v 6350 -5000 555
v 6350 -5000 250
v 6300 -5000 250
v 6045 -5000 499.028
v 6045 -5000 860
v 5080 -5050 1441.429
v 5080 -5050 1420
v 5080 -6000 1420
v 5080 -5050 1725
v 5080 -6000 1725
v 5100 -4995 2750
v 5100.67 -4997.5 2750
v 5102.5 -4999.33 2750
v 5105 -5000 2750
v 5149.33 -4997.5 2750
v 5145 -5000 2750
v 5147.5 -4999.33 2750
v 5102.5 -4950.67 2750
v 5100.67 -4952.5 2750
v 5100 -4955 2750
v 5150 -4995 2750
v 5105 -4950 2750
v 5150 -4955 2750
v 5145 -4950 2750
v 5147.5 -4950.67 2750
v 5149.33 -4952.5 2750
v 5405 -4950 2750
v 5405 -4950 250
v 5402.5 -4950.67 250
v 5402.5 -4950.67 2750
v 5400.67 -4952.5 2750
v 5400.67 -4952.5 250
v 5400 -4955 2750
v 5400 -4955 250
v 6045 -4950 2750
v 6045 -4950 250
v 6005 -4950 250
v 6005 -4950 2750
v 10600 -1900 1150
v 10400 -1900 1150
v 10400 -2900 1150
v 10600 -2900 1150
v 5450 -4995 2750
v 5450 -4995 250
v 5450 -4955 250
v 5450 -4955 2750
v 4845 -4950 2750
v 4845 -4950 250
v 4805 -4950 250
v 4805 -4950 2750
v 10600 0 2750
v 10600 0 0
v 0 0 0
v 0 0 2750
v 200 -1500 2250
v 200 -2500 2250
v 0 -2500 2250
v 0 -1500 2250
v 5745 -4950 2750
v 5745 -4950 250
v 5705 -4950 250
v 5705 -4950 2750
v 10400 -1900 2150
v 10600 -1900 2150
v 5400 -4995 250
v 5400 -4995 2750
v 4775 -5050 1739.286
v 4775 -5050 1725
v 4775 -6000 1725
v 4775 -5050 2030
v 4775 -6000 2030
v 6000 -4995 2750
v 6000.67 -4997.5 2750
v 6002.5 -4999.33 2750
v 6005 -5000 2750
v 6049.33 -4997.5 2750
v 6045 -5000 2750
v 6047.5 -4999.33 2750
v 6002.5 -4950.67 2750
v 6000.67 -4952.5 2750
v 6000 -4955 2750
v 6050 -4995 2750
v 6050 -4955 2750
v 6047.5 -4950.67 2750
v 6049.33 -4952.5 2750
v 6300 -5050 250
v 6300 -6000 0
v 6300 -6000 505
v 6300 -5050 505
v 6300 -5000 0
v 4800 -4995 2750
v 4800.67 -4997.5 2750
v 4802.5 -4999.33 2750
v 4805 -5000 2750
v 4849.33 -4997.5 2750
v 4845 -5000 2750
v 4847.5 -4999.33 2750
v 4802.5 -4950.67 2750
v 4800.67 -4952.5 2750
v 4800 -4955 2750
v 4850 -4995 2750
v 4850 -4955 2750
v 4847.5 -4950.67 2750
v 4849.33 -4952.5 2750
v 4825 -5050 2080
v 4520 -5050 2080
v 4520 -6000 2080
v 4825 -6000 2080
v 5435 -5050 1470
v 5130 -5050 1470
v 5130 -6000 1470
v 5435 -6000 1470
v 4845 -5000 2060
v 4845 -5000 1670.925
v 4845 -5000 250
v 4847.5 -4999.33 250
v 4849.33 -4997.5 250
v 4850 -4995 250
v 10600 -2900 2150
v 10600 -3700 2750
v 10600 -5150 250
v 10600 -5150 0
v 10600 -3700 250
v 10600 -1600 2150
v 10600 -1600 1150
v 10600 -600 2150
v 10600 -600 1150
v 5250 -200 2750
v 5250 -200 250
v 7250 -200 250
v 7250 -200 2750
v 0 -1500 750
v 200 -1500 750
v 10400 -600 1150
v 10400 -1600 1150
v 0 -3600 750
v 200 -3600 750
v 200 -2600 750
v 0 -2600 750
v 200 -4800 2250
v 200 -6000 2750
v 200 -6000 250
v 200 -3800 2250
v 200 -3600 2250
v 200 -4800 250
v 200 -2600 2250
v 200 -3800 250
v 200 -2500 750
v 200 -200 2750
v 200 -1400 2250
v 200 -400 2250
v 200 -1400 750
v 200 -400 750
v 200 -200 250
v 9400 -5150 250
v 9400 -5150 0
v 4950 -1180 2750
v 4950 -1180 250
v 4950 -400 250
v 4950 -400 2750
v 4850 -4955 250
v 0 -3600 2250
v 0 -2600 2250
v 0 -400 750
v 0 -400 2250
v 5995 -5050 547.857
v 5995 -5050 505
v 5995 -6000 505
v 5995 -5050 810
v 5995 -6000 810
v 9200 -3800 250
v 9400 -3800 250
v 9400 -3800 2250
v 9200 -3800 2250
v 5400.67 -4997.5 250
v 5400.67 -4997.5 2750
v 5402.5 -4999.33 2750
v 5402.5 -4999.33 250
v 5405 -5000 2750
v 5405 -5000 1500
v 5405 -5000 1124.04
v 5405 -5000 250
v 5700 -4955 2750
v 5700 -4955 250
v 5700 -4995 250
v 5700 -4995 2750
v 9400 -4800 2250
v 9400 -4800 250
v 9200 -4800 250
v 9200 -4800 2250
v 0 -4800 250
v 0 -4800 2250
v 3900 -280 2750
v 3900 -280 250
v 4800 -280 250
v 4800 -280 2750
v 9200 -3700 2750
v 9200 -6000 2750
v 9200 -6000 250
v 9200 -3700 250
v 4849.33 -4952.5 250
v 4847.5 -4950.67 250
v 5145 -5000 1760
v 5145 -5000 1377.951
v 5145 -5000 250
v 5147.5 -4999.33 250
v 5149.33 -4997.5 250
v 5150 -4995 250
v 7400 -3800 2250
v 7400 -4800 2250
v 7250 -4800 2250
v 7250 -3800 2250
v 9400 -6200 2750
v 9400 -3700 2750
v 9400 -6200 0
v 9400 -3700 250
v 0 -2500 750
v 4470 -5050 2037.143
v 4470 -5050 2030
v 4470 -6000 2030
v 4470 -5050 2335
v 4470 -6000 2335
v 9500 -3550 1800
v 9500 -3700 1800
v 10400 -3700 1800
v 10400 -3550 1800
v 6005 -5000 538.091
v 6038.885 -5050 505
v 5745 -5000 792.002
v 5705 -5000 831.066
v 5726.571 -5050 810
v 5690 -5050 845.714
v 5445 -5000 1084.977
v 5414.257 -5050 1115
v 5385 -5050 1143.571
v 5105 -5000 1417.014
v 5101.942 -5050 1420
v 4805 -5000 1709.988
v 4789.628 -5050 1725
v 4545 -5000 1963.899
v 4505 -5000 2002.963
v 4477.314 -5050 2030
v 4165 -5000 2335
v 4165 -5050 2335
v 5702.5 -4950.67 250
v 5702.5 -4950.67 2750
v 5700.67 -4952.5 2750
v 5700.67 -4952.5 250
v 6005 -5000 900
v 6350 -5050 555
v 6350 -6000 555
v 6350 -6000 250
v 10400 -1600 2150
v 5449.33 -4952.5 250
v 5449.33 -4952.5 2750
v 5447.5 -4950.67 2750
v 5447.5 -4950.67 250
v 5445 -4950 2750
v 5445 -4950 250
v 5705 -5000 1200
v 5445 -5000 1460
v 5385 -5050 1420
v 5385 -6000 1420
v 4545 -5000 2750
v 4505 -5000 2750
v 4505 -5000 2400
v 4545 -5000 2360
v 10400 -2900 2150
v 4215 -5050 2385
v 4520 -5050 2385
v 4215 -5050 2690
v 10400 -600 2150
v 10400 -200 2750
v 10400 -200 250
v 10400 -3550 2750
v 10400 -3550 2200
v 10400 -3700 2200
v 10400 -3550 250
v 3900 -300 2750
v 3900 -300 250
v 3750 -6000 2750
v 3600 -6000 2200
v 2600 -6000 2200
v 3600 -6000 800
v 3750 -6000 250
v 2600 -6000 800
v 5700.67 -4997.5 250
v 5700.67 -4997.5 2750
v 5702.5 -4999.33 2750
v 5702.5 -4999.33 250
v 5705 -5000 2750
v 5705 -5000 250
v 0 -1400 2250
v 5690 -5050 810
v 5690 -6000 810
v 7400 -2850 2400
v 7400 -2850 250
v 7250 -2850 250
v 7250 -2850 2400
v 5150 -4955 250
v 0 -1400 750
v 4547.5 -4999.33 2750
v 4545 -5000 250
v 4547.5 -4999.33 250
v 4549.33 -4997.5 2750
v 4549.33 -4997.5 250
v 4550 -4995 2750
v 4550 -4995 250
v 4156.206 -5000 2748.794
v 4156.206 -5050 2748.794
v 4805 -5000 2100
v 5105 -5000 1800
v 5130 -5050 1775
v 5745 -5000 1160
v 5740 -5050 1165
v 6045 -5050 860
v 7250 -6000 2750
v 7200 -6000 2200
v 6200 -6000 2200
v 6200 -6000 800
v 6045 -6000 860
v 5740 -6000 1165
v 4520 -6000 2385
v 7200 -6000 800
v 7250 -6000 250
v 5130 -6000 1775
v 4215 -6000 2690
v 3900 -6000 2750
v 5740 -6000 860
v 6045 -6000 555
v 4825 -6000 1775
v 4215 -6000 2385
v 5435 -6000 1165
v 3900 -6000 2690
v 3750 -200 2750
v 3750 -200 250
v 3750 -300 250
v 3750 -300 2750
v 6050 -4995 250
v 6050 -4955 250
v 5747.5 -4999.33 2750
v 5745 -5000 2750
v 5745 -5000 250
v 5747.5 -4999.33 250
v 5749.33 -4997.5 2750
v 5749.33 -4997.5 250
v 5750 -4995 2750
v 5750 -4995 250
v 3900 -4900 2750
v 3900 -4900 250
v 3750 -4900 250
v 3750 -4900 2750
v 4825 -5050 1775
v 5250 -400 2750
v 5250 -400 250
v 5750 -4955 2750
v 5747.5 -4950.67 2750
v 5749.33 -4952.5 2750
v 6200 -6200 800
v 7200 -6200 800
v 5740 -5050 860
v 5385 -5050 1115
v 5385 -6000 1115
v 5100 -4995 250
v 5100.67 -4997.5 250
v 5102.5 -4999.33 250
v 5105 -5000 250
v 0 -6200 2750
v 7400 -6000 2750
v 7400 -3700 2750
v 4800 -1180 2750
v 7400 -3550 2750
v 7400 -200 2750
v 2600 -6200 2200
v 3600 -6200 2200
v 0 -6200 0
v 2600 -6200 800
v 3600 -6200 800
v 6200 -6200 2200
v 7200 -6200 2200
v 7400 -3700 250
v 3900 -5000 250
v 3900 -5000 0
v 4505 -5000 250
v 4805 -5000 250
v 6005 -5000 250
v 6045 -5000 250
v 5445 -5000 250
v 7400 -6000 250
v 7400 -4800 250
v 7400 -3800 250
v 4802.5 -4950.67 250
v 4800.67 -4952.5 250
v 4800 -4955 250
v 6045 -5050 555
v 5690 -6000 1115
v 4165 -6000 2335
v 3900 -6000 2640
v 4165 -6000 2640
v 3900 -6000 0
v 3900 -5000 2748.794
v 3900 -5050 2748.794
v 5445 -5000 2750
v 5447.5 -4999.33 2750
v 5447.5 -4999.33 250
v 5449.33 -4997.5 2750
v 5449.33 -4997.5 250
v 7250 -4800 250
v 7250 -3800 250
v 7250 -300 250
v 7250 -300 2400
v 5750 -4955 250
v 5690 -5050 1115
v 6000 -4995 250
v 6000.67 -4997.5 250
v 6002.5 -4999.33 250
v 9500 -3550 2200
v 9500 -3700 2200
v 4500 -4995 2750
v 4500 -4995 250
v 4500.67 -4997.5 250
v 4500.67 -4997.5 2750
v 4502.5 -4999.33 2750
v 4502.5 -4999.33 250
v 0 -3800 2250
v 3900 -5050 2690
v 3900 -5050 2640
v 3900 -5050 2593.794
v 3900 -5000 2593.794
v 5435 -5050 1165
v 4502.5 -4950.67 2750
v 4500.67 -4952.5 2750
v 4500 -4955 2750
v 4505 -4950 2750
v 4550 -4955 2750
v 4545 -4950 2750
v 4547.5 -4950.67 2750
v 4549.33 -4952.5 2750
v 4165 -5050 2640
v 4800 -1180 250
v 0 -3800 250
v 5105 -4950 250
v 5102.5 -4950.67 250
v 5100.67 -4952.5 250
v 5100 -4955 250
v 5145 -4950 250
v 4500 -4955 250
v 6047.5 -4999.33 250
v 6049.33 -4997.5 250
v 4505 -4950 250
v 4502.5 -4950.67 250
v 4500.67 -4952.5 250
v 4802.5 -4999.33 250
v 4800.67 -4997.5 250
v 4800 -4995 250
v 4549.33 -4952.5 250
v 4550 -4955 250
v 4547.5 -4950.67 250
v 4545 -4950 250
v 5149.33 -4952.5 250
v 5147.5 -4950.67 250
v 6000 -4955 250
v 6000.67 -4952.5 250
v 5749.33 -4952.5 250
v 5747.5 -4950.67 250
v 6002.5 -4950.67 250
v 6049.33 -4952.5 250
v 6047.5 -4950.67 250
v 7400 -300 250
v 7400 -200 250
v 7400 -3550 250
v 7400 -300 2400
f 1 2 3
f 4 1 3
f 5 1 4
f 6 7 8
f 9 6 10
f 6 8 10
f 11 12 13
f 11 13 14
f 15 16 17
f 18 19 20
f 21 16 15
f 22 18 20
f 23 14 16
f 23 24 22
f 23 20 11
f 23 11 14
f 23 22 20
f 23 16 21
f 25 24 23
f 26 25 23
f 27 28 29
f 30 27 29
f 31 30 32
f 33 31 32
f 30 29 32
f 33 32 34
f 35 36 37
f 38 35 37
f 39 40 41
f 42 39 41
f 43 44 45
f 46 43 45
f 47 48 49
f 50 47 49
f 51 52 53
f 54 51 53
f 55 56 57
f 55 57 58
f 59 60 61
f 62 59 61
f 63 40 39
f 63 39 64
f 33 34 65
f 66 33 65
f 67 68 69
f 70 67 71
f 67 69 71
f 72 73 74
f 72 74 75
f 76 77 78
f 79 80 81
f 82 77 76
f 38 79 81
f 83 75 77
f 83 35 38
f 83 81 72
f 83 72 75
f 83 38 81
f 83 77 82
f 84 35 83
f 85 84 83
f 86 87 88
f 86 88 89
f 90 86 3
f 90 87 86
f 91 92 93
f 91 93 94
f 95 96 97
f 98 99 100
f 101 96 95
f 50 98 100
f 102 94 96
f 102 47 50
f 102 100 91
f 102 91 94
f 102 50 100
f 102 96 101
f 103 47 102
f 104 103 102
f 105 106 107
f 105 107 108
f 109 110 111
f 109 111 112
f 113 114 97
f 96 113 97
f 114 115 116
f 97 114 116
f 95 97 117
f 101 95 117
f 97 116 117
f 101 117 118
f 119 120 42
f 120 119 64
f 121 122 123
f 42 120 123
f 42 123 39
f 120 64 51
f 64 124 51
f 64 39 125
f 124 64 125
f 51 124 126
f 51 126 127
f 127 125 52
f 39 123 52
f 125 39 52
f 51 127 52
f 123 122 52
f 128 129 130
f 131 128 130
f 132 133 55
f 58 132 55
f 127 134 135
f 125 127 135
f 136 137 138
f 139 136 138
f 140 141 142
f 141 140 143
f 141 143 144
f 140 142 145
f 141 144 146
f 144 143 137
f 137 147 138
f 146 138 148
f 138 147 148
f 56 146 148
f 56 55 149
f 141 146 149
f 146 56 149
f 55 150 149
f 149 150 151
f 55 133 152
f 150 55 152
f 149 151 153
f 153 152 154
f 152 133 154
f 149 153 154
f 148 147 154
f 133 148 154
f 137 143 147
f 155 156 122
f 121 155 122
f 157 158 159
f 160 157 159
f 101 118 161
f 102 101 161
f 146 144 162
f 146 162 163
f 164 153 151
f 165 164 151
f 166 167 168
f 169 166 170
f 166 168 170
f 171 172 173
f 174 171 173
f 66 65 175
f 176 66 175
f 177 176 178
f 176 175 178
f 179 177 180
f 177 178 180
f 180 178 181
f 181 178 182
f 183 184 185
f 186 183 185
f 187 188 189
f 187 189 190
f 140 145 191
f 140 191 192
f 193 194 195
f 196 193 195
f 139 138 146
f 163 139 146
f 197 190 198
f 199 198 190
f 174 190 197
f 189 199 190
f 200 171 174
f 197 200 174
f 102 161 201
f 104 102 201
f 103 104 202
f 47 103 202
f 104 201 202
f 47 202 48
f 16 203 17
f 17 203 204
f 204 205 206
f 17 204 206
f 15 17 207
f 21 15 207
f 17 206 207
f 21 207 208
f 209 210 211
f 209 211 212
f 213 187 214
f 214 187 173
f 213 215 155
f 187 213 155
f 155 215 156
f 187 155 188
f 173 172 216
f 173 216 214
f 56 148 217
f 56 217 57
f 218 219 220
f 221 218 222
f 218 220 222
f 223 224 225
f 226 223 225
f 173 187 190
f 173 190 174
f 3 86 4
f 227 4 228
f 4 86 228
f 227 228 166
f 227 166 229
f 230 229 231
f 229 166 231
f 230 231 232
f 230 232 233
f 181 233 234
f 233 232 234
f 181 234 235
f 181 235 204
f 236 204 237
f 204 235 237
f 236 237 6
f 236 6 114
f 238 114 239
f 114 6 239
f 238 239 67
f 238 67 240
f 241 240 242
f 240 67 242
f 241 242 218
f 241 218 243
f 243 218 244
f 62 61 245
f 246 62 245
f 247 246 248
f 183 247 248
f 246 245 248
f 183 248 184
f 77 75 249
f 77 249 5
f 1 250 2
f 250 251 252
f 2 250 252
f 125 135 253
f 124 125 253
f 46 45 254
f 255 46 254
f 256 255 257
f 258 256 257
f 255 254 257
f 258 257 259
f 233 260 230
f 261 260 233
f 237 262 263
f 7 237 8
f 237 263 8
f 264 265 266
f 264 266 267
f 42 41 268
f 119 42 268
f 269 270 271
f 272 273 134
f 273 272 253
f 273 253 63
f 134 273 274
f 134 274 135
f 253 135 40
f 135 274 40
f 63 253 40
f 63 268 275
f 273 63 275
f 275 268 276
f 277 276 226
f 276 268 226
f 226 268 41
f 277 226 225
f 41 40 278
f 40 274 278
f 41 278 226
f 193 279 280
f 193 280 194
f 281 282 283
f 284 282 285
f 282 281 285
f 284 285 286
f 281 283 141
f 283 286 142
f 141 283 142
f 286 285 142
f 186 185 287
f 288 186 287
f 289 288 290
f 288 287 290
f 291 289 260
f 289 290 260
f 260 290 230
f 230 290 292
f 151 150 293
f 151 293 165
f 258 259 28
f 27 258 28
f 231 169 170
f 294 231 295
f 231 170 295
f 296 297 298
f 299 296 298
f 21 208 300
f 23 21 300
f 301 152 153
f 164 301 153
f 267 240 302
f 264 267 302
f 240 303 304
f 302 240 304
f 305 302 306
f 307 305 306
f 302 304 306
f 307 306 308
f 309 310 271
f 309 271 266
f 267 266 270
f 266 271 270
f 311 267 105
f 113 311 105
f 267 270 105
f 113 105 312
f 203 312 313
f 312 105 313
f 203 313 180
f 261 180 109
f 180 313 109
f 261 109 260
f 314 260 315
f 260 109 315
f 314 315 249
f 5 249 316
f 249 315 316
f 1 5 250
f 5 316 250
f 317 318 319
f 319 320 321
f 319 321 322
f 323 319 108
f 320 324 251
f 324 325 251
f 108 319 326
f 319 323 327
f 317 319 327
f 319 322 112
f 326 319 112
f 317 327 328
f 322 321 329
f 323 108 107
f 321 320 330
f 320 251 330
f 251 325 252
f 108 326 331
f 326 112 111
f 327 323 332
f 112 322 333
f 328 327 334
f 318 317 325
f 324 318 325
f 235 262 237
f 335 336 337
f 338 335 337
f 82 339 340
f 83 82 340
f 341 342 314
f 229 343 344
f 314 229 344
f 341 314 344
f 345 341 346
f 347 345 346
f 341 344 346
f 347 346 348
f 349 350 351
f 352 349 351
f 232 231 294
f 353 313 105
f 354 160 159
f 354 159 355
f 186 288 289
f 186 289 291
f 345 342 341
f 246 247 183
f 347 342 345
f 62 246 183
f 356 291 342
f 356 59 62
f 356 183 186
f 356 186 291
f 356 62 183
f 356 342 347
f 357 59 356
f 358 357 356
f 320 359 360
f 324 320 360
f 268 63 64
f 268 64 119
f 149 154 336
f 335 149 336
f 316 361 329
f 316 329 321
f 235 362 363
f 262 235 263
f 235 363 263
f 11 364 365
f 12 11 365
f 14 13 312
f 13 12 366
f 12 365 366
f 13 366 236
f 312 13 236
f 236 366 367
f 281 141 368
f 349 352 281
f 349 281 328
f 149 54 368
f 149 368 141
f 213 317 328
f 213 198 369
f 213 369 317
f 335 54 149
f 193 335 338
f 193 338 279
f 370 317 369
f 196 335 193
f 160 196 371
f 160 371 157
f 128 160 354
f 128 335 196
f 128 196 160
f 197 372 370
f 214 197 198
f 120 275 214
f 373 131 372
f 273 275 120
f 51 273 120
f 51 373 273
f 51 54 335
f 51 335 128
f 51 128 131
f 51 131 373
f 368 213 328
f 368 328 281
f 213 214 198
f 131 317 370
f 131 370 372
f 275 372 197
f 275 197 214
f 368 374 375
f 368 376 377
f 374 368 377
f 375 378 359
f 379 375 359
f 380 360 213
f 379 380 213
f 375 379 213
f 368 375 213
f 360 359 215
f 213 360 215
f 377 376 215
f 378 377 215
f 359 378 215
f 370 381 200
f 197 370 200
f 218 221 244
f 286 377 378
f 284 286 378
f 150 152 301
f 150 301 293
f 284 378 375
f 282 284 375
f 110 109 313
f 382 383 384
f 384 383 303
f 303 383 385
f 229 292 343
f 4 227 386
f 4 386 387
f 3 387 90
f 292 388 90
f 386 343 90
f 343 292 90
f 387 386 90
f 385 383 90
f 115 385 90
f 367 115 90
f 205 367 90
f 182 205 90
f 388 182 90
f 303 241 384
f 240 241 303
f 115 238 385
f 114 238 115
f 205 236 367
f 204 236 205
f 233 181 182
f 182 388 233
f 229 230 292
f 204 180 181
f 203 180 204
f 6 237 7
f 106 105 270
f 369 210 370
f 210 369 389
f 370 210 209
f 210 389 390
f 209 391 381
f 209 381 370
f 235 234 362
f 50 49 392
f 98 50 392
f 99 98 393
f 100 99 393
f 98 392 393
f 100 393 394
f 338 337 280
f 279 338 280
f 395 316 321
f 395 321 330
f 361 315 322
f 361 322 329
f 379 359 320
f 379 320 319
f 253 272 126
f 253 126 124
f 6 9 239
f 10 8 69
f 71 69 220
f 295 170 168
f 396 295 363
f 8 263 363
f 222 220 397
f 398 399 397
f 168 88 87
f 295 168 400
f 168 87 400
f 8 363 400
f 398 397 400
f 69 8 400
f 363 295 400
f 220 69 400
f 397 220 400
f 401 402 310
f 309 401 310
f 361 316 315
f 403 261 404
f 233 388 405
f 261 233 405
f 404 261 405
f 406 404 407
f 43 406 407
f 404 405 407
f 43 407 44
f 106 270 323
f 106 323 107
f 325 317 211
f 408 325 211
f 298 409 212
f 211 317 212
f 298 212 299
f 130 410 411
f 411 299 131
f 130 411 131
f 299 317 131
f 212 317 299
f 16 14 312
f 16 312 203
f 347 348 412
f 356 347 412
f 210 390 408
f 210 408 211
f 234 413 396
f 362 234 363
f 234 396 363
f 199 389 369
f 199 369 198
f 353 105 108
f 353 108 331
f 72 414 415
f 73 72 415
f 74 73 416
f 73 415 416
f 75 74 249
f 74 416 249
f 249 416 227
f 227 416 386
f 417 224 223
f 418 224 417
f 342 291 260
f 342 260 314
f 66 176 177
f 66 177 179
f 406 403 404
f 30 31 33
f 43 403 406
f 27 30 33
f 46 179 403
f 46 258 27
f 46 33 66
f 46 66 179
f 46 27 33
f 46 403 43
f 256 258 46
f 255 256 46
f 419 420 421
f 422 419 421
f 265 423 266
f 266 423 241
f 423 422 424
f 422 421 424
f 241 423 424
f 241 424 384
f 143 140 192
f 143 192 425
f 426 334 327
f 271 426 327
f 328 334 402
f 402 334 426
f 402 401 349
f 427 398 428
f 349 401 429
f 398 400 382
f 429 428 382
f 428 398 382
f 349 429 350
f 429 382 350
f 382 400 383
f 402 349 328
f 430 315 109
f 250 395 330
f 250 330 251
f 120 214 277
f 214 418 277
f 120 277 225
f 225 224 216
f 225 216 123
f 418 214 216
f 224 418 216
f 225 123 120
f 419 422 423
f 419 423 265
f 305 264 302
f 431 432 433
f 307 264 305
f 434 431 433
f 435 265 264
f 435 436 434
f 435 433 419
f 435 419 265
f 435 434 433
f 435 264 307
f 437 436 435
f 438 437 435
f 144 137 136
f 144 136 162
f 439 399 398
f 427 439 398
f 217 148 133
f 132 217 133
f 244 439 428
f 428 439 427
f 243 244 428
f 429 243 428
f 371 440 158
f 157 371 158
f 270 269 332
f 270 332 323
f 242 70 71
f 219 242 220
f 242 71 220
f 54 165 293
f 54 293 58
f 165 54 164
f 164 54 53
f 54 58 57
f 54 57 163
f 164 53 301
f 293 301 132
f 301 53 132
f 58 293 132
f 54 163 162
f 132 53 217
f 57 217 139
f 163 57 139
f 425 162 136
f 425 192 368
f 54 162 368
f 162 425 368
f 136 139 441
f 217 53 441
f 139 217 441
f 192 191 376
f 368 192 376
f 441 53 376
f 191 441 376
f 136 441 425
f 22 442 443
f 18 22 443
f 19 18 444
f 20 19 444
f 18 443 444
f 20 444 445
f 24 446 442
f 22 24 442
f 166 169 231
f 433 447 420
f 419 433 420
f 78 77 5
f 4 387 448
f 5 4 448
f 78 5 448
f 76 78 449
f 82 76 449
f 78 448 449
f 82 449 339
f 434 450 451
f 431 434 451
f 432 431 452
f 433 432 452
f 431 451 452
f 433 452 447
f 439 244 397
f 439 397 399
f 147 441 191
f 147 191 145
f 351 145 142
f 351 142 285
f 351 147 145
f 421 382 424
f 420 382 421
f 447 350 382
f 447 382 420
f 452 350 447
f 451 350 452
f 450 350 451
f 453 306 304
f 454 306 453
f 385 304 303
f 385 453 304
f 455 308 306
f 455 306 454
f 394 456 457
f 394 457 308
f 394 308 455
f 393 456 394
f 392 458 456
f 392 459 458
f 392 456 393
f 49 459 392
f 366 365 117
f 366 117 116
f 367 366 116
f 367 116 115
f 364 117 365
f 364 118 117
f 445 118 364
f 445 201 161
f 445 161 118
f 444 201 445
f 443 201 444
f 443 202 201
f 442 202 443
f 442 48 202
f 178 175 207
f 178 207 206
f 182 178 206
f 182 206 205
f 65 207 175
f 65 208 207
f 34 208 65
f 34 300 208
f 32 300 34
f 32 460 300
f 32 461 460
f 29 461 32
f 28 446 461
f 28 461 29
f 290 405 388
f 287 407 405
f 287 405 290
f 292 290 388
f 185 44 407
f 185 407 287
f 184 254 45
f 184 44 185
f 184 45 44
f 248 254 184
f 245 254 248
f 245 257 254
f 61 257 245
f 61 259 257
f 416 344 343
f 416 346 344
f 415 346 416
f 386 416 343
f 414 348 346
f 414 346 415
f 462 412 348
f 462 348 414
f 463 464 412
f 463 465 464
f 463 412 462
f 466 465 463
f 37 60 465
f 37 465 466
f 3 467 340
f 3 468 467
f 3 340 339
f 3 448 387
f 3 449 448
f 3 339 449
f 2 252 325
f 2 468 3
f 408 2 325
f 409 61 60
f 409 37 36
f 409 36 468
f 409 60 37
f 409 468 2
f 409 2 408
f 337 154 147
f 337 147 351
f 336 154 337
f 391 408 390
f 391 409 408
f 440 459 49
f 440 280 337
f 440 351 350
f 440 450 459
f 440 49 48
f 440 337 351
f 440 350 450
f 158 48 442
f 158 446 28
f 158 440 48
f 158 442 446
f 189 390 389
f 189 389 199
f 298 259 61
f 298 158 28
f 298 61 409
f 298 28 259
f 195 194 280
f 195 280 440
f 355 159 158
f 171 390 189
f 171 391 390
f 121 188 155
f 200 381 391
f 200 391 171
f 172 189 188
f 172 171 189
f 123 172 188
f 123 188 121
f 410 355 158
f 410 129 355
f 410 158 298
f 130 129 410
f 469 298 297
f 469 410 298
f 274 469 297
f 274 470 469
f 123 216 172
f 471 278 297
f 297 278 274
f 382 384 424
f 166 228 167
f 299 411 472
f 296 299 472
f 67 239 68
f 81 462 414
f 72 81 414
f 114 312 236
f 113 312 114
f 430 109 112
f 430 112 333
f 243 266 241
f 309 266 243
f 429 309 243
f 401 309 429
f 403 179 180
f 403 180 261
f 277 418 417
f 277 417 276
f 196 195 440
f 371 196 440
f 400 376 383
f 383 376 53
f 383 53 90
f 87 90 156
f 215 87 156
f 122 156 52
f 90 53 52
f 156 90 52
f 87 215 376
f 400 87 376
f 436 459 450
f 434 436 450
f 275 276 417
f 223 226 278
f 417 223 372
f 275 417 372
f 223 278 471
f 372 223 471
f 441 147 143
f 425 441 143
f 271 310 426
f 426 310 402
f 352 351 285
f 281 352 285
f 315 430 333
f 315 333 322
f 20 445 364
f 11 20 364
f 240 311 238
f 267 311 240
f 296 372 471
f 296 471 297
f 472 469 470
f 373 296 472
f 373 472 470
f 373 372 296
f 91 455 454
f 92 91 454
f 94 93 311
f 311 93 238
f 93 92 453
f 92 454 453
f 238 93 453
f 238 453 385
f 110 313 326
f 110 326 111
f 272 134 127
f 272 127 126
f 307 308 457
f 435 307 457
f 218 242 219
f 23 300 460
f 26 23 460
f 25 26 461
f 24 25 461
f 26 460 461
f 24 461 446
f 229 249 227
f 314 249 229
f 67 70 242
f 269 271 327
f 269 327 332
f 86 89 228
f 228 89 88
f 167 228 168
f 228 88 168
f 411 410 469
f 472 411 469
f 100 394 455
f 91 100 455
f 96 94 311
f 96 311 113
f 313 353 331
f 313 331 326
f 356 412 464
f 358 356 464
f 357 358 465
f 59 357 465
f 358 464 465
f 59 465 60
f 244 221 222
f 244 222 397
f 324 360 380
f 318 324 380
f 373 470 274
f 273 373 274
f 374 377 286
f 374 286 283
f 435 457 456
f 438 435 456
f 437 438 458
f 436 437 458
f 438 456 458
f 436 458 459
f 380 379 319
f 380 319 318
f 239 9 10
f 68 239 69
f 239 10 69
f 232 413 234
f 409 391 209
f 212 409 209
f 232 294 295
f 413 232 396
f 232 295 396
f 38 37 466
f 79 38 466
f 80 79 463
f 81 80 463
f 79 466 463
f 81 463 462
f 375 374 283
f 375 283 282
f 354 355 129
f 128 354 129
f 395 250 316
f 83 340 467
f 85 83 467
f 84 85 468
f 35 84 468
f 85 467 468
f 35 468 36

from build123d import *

# Parameters (mm, degrees)
F0_W      = 2400
F0_H      = 1000
F1_DEPTH  = 250
F2_W      = 1800
F2_H      = 2300
F3_DEPTH  = 2500
F4_W      = 1000
F4_H      = 2000
F5_DEPTH  = 9400.001
F6_W      = 1000
F6_H      = 1400
F6_W_2    = 900
F6_H_2    = 400
F7_DEPTH  = 6000
F8_W      = 1000
F8_H      = 1000
F9_DEPTH  = 200
F10_W     = 1000
F10_H     = 1500
F11_DEPTH = 200
F12_W     = 150
F12_H     = 2550
F13_DEPTH = 350
F15_DEPTH = 950
F17_DEPTH = 50
F19_DEPTH = 2500


with BuildPart() as f1:
    # F0 (on Top) → F1 (new body)
    with BuildSketch(Plane.XY):
        Polygon((10600, 0), (0, 0), (0, -6200), (9400, -6200), (9400, -5150), (10600, -5150), align=None)
        with Locations((5100, -5500)):
            Rectangle(F0_W, F0_H, mode=Mode.SUBTRACT)
    extrude(amount=F1_DEPTH)

    # F2 (on face) → F3 (join)
    with BuildSketch(Plane.XY.offset(250)):
        Polygon((10600, 0), (0, 0), (0, -6200), (9400, -6200), (9400, -3700), (10600, -3700), align=None)
        with Locations((8300, -4850)):
            Rectangle(F2_W, F2_H, mode=Mode.SUBTRACT)
        Polygon((200, -6000), (200, -200), (3750, -200), (3750, -300), (3900, -300), (3900, -280), (4800, -280), (4800, -1180), (4950, -1180), (4950, -400), (5250, -400), (5250, -200), (7250, -200), (7250, -300), (7400, -300), (7400, -200), (10400, -200), (10400, -3550), (7400, -3550), (7400, -2850), (7250, -2850), (7250, -6000), (3900, -6000), (3900, -4900), (3750, -4900), (3750, -6000), align=None, mode=Mode.SUBTRACT)
    extrude(amount=F3_DEPTH)

    # F4 (on face) → F5 (cut, through all)
    with BuildSketch(Plane.YZ.offset(9400)):
        with Locations((-4300, 1250)):
            Rectangle(F4_W, F4_H)
    extrude(amount=-F5_DEPTH, mode=Mode.SUBTRACT)

    # F6 (on face) → F7 (cut, through all)
    with BuildSketch(Plane.XZ.offset(6200)):
        with Locations((6700, 1500)):
            Rectangle(F6_W, F6_H)
        with Locations((3100, 1500)):
            Rectangle(F6_W, F6_H)
        with Locations((9950, 2000)):
            Rectangle(F6_W_2, F6_H_2)
    extrude(amount=-F7_DEPTH, mode=Mode.SUBTRACT)

    # F8 (on face) → F9 (cut, through all)
    with BuildSketch(Plane(origin=(10400, 0, 0), x_dir=(0, -1, 0), z_dir=(-1, 0, 0))):
        with Locations((1100, 1650)):
            Rectangle(F8_W, F8_H)
        with Locations((2400, 1650)):
            Rectangle(F8_W, F8_H)
    extrude(amount=-F9_DEPTH, mode=Mode.SUBTRACT)

    # F10 (on face) → F11 (cut, through all)
    with BuildSketch(Plane.YZ.offset(200)):
        with Locations((-3100, 1500)):
            Rectangle(F10_W, F10_H)
        with Locations((-2000, 1500)):
            Rectangle(F10_W, F10_H)
        with Locations((-900, 1500)):
            Rectangle(F10_W, F10_H)
    extrude(amount=-F11_DEPTH, mode=Mode.SUBTRACT)

    # F12 (on face) → F13 (join)
    with BuildSketch(Plane.XY.offset(2750)):
        with Locations((7325, -1575)):
            Rectangle(F12_W, F12_H)
    extrude(amount=-F13_DEPTH)

    # F14 (on face) → F15 (join)
    with BuildSketch(Plane(origin=(0, -6000, 0), x_dir=(-1, 0, 0), z_dir=(0, 1, 0))):
        Polygon((-6350, 555), (-6350, 250), (-6300, 250), (-6300, 505), (-5995, 505), (-5995, 810), (-5690, 810), (-5690, 1115), (-5385, 1115), (-5385, 1420), (-5080, 1420), (-5080, 1725), (-4775, 1725), (-4775, 2030), (-4470, 2030), (-4470, 2335), (-4165, 2335), (-4165, 2640), (-3900, 2640), (-3900, 2690), (-4215, 2690), (-4215, 2385), (-4520, 2385), (-4520, 2080), (-4825, 2080), (-4825, 1775), (-5130, 1775), (-5130, 1470), (-5435, 1470), (-5435, 1165), (-5740, 1165), (-5740, 860), (-6045, 860), (-6045, 555), align=None)
    extrude(amount=F15_DEPTH)

    # F16 (on face) → F17 (join)
    with BuildSketch(Plane(origin=(0, -5050, 0), x_dir=(-1, 0, 0), z_dir=(0, 1, 0))):
        Polygon((-4156.206089, 2748.793911), (-6350, 555), (-6350, 250), (-6300, 250), (-4165, 2335), (-3900, 2593.793911), (-3900, 2748.793911), align=None)
    extrude(amount=F17_DEPTH)

    # F18 (on face) → F19 (join)
    with BuildSketch(Plane.XY.offset(250)):
        with BuildLine():
            Line((6005, -5000), (6045, -5000))
            ThreePointArc((6045, -5000), (6048.535534, -4998.535534), (6050, -4995))
            Line((6050, -4995), (6050, -4955))
            ThreePointArc((6050, -4955), (6048.535534, -4951.464466), (6045, -4950))
            Line((6045, -4950), (6005, -4950))
            ThreePointArc((6005, -4950), (6001.464466, -4951.464466), (6000, -4955))
            Line((6000, -4955), (6000, -4995))
            ThreePointArc((6000, -4995), (6001.464466, -4998.535534), (6005, -5000))
        make_face()
        with BuildLine():
            Line((5705, -5000), (5745, -5000))
            ThreePointArc((5745, -5000), (5748.535534, -4998.535534), (5750, -4995))
            Line((5750, -4995), (5750, -4955))
            ThreePointArc((5750, -4955), (5748.535534, -4951.464466), (5745, -4950))
            Line((5745, -4950), (5705, -4950))
            ThreePointArc((5705, -4950), (5701.464466, -4951.464466), (5700, -4955))
            Line((5700, -4955), (5700, -4995))
            ThreePointArc((5700, -4995), (5701.464466, -4998.535534), (5705, -5000))
        make_face()
        with BuildLine():
            Line((5405, -5000), (5445, -5000))
            ThreePointArc((5445, -5000), (5448.535534, -4998.535534), (5450, -4995))
            Line((5450, -4995), (5450, -4955))
            ThreePointArc((5450, -4955), (5448.535534, -4951.464466), (5445, -4950))
            Line((5445, -4950), (5405, -4950))
            ThreePointArc((5405, -4950), (5401.464466, -4951.464466), (5400, -4955))
            Line((5400, -4955), (5400, -4995))
            ThreePointArc((5400, -4995), (5401.464466, -4998.535534), (5405, -5000))
        make_face()
        with BuildLine():
            Line((5105, -5000), (5145, -5000))
            ThreePointArc((5145, -5000), (5148.535534, -4998.535534), (5150, -4995))
            Line((5150, -4995), (5150, -4955))
            ThreePointArc((5150, -4955), (5148.535534, -4951.464466), (5145, -4950))
            Line((5145, -4950), (5105, -4950))
            ThreePointArc((5105, -4950), (5101.464466, -4951.464466), (5100, -4955))
            Line((5100, -4955), (5100, -4995))
            ThreePointArc((5100, -4995), (5101.464466, -4998.535534), (5105, -5000))
        make_face()
        with BuildLine():
            Line((4805, -5000), (4845, -5000))
            ThreePointArc((4845, -5000), (4848.535534, -4998.535534), (4850, -4995))
            Line((4850, -4995), (4850, -4955))
            ThreePointArc((4850, -4955), (4848.535534, -4951.464466), (4845, -4950))
            Line((4845, -4950), (4805, -4950))
            ThreePointArc((4805, -4950), (4801.464466, -4951.464466), (4800, -4955))
            Line((4800, -4955), (4800, -4995))
            ThreePointArc((4800, -4995), (4801.464466, -4998.535534), (4805, -5000))
        make_face()
        with BuildLine():
            Line((4505, -5000), (4545, -5000))
            ThreePointArc((4545, -5000), (4548.535534, -4998.535534), (4550, -4995))
            Line((4550, -4995), (4550, -4955))
            ThreePointArc((4550, -4955), (4548.535534, -4951.464466), (4545, -4950))
            Line((4545, -4950), (4505, -4950))
            ThreePointArc((4505, -4950), (4501.464466, -4951.464466), (4500, -4955))
            Line((4500, -4955), (4500, -4995))
            ThreePointArc((4500, -4995), (4501.464466, -4998.535534), (4505, -5000))
        make_face()
    extrude(amount=F19_DEPTH)


solid = f1.part
